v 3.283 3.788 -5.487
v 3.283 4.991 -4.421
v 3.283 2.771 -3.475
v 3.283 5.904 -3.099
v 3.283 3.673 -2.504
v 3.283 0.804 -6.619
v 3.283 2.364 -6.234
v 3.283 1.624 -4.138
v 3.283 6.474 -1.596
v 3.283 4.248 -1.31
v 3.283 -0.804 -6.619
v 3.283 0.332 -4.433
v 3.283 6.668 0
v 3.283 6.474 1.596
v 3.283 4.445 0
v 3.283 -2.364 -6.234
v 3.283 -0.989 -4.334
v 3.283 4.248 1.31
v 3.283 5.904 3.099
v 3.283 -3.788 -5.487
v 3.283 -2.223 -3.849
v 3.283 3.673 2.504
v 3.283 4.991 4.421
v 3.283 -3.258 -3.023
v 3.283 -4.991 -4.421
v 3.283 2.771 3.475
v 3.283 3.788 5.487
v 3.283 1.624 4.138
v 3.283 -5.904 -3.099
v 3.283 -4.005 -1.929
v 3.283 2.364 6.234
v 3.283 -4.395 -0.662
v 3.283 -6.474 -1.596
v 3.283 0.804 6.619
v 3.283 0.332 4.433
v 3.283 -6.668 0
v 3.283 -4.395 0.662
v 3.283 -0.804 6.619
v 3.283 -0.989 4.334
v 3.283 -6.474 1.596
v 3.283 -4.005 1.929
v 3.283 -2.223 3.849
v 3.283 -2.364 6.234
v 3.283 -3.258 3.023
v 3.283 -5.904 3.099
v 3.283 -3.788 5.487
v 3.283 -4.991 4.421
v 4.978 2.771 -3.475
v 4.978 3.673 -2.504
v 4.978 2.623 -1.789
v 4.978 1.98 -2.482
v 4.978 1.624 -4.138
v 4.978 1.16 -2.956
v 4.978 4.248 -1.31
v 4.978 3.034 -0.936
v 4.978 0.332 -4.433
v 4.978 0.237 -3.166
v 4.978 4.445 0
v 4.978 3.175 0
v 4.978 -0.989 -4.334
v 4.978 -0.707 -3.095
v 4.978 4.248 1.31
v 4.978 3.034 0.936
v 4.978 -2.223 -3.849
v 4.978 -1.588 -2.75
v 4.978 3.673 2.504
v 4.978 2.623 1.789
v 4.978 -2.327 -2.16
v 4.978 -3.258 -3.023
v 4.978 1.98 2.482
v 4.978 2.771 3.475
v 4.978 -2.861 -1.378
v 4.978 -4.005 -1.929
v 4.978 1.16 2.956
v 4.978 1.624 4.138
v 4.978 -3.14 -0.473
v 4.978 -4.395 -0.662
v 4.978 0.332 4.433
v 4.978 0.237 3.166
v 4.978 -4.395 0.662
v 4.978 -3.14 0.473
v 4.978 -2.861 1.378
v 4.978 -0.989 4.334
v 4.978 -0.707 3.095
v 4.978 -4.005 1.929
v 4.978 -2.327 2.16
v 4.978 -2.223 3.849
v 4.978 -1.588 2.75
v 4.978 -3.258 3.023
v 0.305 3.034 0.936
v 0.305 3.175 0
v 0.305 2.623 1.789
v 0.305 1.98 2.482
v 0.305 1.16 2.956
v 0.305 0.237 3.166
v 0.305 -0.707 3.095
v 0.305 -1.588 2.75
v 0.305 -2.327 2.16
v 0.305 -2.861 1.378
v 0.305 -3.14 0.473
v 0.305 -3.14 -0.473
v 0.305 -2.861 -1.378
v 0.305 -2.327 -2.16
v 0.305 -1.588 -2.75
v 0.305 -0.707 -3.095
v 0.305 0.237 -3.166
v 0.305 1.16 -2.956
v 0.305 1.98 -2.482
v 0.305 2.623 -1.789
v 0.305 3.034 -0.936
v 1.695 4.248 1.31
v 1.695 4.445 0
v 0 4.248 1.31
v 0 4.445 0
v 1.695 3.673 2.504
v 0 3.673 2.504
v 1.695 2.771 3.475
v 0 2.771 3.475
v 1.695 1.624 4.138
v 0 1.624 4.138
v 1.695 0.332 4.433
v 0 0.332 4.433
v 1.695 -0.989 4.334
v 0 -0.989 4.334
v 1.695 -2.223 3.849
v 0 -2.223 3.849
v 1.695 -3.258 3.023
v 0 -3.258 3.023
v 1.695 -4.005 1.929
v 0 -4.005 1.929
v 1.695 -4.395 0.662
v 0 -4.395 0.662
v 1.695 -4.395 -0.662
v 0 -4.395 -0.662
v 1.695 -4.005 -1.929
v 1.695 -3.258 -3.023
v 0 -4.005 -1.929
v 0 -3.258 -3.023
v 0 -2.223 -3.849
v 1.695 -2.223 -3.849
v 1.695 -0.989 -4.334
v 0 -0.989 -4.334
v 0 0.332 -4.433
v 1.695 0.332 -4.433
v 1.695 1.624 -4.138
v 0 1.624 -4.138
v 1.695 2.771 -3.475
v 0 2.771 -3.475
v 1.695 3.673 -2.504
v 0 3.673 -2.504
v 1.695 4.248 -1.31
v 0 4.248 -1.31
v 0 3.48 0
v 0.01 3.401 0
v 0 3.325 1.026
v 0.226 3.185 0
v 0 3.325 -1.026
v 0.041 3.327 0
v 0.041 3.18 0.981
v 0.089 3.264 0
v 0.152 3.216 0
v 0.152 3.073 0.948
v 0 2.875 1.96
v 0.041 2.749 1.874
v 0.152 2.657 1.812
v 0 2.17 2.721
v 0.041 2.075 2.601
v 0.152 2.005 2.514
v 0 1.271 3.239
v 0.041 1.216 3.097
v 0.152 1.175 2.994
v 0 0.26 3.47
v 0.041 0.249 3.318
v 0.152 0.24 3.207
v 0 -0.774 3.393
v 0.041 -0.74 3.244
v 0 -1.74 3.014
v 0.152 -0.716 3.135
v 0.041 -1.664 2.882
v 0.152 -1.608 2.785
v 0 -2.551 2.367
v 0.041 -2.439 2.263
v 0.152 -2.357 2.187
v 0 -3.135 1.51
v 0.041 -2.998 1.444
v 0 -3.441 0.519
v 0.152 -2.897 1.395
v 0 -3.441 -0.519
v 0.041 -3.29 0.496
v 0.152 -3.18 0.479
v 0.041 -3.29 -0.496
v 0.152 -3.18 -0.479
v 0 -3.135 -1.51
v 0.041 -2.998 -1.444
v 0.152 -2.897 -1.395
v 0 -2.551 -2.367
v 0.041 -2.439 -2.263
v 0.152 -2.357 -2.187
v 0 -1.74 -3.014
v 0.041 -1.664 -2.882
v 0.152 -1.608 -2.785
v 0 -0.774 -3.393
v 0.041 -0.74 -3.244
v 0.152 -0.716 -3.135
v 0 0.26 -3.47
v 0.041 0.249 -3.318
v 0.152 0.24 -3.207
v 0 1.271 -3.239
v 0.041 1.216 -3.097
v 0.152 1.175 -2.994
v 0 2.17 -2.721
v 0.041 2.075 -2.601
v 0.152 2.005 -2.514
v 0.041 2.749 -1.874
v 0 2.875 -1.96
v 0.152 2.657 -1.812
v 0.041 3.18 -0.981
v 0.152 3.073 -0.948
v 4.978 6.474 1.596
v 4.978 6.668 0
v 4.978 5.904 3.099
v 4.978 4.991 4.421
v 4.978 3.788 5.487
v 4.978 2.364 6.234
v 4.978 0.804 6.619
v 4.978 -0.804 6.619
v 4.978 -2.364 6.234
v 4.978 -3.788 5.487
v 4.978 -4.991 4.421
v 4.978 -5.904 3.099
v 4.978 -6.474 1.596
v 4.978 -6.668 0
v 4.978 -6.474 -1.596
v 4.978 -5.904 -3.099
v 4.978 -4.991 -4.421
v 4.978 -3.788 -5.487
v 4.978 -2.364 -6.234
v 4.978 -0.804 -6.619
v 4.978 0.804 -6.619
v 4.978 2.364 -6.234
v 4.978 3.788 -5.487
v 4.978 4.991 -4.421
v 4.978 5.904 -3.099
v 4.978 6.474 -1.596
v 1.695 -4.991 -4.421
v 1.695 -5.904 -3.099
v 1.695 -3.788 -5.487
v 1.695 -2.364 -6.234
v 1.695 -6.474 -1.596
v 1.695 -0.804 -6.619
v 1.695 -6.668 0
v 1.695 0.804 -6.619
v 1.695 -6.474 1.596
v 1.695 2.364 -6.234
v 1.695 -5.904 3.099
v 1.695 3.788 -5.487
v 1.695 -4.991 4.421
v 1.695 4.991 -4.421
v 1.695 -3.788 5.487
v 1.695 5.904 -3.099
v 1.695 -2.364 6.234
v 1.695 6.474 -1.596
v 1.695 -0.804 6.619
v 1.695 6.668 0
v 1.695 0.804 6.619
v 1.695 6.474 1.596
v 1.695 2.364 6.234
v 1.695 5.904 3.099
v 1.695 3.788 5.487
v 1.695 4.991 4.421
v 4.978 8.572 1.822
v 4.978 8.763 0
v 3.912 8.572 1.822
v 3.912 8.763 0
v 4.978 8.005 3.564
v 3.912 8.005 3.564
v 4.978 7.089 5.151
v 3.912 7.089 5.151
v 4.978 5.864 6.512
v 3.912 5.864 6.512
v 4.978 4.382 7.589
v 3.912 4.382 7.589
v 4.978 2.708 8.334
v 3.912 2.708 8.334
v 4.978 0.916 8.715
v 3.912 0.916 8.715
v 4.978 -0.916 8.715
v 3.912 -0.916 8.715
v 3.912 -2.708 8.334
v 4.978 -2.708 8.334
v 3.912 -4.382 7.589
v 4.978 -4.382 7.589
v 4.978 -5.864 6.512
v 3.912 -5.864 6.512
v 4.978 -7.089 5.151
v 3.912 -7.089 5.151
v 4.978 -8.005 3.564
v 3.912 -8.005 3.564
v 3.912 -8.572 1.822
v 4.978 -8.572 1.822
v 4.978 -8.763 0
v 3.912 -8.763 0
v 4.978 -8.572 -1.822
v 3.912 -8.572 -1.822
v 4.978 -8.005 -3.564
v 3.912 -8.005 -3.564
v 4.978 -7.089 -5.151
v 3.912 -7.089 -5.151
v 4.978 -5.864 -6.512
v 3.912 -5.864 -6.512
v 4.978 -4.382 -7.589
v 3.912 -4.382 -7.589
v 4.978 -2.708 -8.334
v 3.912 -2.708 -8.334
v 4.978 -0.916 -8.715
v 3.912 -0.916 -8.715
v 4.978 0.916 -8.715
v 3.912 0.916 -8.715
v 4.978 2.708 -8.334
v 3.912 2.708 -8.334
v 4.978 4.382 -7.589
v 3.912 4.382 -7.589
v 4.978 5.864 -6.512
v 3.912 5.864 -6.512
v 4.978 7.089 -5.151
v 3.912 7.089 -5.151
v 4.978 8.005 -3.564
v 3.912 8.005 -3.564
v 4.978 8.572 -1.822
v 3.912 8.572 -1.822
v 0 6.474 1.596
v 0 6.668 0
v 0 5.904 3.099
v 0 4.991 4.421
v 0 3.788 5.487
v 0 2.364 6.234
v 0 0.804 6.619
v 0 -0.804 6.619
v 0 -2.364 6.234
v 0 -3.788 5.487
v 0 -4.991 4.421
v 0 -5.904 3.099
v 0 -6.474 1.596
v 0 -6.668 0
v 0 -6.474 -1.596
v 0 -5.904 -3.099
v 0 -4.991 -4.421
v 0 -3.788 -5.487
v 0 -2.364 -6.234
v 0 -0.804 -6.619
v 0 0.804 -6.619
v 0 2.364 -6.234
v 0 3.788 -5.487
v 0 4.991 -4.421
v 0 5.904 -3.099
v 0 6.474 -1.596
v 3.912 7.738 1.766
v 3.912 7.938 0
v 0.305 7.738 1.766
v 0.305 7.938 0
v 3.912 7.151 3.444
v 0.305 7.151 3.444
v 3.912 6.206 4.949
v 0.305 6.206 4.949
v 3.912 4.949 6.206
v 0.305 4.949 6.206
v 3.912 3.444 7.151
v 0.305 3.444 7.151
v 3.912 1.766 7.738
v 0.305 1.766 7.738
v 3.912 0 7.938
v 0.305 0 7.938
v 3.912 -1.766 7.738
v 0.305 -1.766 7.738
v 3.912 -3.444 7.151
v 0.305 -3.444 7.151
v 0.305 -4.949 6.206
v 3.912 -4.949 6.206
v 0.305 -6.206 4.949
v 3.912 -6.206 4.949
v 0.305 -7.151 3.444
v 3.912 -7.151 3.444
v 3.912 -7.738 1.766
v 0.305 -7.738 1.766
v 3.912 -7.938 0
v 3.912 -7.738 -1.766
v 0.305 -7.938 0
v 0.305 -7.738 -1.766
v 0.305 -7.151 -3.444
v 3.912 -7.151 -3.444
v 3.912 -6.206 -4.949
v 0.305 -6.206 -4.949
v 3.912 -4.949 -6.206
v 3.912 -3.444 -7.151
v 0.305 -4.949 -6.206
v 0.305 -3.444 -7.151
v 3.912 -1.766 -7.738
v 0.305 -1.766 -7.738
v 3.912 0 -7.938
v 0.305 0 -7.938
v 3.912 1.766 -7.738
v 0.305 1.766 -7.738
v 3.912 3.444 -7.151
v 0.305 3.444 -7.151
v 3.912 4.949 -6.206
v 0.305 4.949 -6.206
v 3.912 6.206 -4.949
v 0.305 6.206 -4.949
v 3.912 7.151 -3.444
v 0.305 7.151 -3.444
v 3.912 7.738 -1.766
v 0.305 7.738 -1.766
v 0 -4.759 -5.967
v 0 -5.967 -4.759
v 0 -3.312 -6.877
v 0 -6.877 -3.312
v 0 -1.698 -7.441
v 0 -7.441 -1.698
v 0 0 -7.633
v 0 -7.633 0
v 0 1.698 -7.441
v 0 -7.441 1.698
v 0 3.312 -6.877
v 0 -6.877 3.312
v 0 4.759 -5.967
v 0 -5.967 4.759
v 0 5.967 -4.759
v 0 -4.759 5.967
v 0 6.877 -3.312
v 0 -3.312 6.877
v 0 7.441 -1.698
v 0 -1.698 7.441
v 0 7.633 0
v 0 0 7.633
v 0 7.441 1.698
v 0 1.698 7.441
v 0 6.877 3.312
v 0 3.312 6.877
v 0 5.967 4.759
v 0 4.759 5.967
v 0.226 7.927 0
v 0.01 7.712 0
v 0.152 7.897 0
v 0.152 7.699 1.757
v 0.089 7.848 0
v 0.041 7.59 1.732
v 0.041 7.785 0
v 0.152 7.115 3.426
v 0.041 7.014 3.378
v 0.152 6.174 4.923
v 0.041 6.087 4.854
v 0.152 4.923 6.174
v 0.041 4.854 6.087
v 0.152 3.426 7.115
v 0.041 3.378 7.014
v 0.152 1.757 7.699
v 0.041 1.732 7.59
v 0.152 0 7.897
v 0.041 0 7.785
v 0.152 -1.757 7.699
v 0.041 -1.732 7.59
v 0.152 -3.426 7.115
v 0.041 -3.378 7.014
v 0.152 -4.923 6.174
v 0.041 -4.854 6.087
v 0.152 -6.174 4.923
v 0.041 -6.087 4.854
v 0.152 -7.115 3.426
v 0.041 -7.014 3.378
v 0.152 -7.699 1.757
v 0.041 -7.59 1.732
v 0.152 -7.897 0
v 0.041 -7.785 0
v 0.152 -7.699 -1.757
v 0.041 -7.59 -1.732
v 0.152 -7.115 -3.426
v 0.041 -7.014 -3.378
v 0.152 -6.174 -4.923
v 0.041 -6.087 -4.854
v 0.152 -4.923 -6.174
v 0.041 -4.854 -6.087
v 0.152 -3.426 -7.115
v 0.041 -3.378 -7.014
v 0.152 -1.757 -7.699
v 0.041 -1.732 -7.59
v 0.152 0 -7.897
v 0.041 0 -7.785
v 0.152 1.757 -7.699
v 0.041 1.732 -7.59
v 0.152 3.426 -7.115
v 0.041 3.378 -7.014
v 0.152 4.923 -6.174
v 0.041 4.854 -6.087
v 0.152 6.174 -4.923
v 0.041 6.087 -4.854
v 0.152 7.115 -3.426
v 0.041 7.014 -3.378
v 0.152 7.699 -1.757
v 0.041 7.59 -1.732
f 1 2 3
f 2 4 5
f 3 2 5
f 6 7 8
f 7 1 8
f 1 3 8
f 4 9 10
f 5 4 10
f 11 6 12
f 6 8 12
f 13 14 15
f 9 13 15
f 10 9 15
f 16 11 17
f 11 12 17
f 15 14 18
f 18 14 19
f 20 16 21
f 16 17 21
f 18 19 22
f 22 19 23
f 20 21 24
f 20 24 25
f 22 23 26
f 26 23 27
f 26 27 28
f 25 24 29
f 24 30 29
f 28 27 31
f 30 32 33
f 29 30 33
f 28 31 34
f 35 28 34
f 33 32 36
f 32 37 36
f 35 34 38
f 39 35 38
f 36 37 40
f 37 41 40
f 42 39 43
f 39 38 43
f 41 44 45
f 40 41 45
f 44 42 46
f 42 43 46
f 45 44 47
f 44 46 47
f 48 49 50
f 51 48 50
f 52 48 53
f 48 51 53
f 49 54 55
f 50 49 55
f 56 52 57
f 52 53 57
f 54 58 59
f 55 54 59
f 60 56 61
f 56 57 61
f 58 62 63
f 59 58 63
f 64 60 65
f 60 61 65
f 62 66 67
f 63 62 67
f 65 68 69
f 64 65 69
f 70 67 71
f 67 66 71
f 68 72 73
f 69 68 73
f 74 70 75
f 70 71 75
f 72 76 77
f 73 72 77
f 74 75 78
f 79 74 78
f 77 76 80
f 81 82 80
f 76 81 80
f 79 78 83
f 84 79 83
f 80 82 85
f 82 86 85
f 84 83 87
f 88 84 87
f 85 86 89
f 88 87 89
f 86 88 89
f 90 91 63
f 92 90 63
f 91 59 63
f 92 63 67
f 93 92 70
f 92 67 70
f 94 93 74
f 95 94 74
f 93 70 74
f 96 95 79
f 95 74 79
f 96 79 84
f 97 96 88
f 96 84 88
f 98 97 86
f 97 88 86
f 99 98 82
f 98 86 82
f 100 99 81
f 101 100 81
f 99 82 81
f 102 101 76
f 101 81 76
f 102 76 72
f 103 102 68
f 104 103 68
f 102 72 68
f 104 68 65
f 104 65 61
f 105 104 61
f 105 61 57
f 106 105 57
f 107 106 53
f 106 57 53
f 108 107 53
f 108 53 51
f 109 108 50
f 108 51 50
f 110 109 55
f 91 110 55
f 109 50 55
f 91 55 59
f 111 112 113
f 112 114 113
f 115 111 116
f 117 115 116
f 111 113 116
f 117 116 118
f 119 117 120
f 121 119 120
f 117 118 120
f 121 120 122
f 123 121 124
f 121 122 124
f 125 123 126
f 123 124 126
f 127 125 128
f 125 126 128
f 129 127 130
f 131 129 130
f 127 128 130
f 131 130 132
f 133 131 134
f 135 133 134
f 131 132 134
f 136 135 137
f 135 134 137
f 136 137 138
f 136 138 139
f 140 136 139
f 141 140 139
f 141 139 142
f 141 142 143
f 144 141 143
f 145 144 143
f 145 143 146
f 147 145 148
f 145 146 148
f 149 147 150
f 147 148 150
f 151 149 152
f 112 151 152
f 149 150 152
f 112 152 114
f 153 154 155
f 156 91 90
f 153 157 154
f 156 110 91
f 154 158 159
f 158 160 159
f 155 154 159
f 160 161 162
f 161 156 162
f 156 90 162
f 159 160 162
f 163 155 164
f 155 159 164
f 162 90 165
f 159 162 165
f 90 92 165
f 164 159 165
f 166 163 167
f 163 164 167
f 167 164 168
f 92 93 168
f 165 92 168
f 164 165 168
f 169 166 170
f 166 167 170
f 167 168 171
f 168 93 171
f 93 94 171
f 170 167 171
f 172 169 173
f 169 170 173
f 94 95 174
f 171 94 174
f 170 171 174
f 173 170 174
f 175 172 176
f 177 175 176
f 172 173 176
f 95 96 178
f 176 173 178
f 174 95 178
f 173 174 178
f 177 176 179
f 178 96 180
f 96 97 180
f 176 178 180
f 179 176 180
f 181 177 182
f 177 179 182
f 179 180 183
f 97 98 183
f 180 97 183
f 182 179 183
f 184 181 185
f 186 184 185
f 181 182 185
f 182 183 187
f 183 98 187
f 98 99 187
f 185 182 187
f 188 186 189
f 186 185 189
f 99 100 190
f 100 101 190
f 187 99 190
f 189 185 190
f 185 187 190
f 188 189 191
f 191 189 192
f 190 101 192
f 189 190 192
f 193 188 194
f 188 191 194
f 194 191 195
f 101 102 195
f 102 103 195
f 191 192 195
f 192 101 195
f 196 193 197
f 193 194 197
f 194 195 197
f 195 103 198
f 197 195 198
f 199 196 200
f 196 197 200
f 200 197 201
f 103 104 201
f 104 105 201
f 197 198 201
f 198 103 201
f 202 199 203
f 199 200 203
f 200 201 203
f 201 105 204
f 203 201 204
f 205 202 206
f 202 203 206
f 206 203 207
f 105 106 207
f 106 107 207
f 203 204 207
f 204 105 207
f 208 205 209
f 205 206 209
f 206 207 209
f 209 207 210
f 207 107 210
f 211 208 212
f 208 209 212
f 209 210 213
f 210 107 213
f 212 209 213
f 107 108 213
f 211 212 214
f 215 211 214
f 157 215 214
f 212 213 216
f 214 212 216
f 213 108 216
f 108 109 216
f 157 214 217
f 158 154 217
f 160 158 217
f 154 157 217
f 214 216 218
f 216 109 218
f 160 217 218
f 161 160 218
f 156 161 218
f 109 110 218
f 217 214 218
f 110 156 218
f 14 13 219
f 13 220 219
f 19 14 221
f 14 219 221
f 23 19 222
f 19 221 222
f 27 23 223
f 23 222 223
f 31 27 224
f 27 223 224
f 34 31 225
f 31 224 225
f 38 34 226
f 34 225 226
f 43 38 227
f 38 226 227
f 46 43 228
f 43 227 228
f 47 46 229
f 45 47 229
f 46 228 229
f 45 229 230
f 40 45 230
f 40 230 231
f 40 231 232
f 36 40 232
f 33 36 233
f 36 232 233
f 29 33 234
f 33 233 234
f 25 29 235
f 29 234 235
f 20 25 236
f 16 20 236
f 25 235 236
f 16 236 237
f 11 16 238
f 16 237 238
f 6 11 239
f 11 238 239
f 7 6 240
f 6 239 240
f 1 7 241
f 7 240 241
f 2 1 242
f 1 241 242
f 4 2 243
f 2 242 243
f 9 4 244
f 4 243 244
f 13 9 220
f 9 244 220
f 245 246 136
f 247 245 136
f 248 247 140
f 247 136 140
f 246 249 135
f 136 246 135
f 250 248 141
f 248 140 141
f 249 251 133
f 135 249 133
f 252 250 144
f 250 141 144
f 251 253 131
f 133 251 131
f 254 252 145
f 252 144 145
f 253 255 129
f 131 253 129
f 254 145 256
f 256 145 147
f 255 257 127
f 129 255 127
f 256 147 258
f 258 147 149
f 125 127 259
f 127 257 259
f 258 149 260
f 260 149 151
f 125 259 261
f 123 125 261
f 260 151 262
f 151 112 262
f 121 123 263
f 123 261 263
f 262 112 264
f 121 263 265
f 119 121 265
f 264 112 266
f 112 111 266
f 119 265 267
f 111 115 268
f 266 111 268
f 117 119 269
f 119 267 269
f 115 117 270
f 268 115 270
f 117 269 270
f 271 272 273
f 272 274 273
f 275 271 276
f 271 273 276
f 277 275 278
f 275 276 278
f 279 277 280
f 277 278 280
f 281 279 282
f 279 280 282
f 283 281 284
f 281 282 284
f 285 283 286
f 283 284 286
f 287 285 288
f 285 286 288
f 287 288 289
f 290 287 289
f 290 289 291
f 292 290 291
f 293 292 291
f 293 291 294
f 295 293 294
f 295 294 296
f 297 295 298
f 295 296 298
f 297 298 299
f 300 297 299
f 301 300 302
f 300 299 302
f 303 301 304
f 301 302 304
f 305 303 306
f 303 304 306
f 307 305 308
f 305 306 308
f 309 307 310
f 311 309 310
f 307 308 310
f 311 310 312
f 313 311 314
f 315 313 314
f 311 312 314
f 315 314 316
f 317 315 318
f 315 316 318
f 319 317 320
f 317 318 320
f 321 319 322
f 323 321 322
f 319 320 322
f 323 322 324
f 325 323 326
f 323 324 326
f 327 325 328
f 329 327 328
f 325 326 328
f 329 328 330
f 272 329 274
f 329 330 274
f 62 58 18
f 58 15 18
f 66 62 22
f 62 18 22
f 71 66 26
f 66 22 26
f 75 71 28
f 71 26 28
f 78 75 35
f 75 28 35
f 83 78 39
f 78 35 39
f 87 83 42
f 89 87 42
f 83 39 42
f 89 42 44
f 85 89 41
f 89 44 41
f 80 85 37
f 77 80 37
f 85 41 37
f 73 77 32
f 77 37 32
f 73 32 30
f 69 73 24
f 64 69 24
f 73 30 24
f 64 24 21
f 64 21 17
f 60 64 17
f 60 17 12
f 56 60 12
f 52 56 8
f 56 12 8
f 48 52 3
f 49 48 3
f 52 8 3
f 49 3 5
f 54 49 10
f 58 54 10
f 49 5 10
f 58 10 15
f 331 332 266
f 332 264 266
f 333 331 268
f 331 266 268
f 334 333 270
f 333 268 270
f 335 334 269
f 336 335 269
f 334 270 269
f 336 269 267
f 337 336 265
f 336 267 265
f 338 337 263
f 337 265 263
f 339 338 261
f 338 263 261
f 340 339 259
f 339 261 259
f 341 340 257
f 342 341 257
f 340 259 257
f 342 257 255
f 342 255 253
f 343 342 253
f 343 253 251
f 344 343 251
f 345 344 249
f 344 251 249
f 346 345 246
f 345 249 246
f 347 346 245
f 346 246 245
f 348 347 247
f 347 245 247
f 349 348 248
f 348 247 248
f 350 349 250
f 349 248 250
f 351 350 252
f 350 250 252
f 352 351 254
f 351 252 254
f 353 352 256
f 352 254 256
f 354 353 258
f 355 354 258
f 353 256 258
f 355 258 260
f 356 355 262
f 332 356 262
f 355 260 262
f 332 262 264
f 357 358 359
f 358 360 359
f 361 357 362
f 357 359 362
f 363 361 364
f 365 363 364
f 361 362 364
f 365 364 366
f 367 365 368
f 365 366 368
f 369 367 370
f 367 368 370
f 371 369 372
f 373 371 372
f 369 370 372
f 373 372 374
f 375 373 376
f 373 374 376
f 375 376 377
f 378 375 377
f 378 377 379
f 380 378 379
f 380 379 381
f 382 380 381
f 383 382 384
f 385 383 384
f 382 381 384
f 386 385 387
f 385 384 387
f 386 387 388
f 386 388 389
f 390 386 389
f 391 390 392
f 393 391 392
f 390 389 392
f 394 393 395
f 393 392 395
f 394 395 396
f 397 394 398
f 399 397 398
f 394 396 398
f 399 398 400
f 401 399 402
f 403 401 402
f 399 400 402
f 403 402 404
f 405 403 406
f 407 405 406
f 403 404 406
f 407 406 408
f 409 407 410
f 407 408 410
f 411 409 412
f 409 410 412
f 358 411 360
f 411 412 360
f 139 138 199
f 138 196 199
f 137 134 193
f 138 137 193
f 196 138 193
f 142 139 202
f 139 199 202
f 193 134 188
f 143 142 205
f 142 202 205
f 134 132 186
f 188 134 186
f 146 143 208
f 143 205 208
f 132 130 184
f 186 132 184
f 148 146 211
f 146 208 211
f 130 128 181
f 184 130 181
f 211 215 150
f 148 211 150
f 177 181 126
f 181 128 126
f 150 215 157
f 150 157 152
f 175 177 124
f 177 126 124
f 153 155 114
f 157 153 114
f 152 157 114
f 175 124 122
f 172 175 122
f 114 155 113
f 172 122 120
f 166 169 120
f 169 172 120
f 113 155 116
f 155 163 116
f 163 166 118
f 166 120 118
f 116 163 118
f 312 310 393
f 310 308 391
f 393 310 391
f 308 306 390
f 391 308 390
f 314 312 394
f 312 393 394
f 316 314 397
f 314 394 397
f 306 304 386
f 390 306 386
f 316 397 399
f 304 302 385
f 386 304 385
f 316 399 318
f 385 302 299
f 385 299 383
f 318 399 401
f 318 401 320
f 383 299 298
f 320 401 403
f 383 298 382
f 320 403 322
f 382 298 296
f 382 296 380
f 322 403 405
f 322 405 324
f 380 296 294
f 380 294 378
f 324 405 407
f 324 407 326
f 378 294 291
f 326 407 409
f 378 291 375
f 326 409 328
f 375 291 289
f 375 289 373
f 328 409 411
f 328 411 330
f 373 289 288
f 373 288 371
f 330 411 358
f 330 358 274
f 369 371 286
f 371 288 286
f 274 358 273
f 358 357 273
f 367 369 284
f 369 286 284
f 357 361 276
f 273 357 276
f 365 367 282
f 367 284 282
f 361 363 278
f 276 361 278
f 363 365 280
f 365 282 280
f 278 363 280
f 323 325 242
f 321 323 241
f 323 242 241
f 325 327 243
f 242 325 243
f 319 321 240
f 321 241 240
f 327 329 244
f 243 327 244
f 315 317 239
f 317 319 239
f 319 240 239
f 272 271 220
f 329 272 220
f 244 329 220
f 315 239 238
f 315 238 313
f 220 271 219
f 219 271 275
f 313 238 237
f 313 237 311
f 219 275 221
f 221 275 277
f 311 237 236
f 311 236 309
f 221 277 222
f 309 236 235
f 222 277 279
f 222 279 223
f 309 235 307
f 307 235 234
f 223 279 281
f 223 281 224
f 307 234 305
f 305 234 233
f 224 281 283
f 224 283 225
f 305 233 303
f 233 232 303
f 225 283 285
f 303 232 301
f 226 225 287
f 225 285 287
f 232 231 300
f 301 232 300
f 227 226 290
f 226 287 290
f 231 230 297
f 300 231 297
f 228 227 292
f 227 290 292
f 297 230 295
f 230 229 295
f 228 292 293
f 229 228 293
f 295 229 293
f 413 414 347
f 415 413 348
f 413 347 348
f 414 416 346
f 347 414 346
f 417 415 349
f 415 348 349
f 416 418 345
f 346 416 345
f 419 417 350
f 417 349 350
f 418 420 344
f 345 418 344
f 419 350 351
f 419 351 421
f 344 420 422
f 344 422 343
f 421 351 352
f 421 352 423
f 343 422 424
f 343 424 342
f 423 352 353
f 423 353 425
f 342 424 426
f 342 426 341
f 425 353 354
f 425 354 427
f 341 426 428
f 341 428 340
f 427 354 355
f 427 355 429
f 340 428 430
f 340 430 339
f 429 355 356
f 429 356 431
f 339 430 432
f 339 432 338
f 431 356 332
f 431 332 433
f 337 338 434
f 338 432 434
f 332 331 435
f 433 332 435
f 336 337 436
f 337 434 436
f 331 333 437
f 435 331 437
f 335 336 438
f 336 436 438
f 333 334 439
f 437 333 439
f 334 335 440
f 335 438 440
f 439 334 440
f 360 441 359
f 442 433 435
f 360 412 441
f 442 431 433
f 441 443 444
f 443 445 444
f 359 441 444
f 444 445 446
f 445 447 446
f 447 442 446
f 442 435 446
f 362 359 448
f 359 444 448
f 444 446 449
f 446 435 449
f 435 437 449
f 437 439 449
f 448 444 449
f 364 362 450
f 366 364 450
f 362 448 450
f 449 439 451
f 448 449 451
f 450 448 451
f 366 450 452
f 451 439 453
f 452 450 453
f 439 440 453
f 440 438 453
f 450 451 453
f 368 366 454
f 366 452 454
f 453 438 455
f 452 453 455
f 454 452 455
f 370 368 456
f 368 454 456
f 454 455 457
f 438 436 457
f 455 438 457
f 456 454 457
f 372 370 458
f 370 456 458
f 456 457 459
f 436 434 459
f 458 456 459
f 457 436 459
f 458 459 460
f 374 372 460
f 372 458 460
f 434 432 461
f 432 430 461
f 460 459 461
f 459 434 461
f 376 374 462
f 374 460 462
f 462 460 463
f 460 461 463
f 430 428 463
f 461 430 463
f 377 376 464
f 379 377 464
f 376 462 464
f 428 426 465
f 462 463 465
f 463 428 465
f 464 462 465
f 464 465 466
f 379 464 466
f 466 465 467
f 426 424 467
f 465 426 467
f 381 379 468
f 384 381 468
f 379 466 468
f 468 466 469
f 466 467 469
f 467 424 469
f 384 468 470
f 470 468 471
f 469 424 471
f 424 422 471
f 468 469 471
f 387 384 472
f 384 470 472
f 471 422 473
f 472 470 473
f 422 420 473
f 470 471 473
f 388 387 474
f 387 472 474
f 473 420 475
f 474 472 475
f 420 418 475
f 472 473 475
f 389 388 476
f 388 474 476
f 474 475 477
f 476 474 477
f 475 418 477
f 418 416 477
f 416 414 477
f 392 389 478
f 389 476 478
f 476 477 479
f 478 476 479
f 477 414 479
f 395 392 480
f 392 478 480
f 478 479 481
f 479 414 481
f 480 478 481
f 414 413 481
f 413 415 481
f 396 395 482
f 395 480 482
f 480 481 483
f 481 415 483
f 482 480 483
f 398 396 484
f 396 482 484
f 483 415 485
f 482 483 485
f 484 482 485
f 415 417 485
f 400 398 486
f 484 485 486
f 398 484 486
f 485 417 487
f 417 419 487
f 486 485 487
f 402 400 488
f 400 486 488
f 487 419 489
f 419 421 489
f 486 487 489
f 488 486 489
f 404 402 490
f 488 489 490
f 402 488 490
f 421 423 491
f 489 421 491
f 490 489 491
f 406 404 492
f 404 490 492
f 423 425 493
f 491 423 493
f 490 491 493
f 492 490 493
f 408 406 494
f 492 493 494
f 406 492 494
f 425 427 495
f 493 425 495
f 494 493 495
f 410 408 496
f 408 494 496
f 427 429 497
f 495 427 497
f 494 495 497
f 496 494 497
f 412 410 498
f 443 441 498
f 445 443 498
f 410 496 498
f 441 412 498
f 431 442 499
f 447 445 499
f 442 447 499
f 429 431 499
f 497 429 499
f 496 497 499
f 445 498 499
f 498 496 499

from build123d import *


with BuildPart() as part:
    # Sketch3 → bearing-revolution (revolve)
    with BuildSketch(Plane.XY):
        with BuildLine():
            Line((0.3048, 3.175), (4.9784, 3.175))
            Line((4.9784, 3.175), (4.9784, 4.445))
            Line((4.9784, 4.445), (3.28295, 4.445))
            Line((3.28295, 4.445), (3.28295, 6.6675))
            Line((3.28295, 6.6675), (4.9784, 6.6675))
            Line((4.9784, 6.6675), (4.9784, 8.763))
            Line((4.9784, 8.763), (3.9116, 8.763))
            Line((3.9116, 8.763), (3.9116, 7.9375))
            Line((3.9116, 7.9375), (0.3048, 7.9375))
            ThreePointArc((0.3048, 7.9375), (0.089273853, 7.848226147), (0, 7.6327))
            Line((0, 7.6327), (0, 6.6675))
            Line((0, 6.6675), (1.69545, 6.6675))
            Line((1.69545, 6.6675), (1.69545, 4.445))
            Line((1.69545, 4.445), (0, 4.445))
            Line((0, 4.445), (0, 3.4798))
            ThreePointArc((0, 3.4798), (0.089273853, 3.264273853), (0.3048, 3.175))
        make_face()
    revolve(axis=Axis((-4.832058368, 0, 0), (1, 0, 0)))


solid = part.part
